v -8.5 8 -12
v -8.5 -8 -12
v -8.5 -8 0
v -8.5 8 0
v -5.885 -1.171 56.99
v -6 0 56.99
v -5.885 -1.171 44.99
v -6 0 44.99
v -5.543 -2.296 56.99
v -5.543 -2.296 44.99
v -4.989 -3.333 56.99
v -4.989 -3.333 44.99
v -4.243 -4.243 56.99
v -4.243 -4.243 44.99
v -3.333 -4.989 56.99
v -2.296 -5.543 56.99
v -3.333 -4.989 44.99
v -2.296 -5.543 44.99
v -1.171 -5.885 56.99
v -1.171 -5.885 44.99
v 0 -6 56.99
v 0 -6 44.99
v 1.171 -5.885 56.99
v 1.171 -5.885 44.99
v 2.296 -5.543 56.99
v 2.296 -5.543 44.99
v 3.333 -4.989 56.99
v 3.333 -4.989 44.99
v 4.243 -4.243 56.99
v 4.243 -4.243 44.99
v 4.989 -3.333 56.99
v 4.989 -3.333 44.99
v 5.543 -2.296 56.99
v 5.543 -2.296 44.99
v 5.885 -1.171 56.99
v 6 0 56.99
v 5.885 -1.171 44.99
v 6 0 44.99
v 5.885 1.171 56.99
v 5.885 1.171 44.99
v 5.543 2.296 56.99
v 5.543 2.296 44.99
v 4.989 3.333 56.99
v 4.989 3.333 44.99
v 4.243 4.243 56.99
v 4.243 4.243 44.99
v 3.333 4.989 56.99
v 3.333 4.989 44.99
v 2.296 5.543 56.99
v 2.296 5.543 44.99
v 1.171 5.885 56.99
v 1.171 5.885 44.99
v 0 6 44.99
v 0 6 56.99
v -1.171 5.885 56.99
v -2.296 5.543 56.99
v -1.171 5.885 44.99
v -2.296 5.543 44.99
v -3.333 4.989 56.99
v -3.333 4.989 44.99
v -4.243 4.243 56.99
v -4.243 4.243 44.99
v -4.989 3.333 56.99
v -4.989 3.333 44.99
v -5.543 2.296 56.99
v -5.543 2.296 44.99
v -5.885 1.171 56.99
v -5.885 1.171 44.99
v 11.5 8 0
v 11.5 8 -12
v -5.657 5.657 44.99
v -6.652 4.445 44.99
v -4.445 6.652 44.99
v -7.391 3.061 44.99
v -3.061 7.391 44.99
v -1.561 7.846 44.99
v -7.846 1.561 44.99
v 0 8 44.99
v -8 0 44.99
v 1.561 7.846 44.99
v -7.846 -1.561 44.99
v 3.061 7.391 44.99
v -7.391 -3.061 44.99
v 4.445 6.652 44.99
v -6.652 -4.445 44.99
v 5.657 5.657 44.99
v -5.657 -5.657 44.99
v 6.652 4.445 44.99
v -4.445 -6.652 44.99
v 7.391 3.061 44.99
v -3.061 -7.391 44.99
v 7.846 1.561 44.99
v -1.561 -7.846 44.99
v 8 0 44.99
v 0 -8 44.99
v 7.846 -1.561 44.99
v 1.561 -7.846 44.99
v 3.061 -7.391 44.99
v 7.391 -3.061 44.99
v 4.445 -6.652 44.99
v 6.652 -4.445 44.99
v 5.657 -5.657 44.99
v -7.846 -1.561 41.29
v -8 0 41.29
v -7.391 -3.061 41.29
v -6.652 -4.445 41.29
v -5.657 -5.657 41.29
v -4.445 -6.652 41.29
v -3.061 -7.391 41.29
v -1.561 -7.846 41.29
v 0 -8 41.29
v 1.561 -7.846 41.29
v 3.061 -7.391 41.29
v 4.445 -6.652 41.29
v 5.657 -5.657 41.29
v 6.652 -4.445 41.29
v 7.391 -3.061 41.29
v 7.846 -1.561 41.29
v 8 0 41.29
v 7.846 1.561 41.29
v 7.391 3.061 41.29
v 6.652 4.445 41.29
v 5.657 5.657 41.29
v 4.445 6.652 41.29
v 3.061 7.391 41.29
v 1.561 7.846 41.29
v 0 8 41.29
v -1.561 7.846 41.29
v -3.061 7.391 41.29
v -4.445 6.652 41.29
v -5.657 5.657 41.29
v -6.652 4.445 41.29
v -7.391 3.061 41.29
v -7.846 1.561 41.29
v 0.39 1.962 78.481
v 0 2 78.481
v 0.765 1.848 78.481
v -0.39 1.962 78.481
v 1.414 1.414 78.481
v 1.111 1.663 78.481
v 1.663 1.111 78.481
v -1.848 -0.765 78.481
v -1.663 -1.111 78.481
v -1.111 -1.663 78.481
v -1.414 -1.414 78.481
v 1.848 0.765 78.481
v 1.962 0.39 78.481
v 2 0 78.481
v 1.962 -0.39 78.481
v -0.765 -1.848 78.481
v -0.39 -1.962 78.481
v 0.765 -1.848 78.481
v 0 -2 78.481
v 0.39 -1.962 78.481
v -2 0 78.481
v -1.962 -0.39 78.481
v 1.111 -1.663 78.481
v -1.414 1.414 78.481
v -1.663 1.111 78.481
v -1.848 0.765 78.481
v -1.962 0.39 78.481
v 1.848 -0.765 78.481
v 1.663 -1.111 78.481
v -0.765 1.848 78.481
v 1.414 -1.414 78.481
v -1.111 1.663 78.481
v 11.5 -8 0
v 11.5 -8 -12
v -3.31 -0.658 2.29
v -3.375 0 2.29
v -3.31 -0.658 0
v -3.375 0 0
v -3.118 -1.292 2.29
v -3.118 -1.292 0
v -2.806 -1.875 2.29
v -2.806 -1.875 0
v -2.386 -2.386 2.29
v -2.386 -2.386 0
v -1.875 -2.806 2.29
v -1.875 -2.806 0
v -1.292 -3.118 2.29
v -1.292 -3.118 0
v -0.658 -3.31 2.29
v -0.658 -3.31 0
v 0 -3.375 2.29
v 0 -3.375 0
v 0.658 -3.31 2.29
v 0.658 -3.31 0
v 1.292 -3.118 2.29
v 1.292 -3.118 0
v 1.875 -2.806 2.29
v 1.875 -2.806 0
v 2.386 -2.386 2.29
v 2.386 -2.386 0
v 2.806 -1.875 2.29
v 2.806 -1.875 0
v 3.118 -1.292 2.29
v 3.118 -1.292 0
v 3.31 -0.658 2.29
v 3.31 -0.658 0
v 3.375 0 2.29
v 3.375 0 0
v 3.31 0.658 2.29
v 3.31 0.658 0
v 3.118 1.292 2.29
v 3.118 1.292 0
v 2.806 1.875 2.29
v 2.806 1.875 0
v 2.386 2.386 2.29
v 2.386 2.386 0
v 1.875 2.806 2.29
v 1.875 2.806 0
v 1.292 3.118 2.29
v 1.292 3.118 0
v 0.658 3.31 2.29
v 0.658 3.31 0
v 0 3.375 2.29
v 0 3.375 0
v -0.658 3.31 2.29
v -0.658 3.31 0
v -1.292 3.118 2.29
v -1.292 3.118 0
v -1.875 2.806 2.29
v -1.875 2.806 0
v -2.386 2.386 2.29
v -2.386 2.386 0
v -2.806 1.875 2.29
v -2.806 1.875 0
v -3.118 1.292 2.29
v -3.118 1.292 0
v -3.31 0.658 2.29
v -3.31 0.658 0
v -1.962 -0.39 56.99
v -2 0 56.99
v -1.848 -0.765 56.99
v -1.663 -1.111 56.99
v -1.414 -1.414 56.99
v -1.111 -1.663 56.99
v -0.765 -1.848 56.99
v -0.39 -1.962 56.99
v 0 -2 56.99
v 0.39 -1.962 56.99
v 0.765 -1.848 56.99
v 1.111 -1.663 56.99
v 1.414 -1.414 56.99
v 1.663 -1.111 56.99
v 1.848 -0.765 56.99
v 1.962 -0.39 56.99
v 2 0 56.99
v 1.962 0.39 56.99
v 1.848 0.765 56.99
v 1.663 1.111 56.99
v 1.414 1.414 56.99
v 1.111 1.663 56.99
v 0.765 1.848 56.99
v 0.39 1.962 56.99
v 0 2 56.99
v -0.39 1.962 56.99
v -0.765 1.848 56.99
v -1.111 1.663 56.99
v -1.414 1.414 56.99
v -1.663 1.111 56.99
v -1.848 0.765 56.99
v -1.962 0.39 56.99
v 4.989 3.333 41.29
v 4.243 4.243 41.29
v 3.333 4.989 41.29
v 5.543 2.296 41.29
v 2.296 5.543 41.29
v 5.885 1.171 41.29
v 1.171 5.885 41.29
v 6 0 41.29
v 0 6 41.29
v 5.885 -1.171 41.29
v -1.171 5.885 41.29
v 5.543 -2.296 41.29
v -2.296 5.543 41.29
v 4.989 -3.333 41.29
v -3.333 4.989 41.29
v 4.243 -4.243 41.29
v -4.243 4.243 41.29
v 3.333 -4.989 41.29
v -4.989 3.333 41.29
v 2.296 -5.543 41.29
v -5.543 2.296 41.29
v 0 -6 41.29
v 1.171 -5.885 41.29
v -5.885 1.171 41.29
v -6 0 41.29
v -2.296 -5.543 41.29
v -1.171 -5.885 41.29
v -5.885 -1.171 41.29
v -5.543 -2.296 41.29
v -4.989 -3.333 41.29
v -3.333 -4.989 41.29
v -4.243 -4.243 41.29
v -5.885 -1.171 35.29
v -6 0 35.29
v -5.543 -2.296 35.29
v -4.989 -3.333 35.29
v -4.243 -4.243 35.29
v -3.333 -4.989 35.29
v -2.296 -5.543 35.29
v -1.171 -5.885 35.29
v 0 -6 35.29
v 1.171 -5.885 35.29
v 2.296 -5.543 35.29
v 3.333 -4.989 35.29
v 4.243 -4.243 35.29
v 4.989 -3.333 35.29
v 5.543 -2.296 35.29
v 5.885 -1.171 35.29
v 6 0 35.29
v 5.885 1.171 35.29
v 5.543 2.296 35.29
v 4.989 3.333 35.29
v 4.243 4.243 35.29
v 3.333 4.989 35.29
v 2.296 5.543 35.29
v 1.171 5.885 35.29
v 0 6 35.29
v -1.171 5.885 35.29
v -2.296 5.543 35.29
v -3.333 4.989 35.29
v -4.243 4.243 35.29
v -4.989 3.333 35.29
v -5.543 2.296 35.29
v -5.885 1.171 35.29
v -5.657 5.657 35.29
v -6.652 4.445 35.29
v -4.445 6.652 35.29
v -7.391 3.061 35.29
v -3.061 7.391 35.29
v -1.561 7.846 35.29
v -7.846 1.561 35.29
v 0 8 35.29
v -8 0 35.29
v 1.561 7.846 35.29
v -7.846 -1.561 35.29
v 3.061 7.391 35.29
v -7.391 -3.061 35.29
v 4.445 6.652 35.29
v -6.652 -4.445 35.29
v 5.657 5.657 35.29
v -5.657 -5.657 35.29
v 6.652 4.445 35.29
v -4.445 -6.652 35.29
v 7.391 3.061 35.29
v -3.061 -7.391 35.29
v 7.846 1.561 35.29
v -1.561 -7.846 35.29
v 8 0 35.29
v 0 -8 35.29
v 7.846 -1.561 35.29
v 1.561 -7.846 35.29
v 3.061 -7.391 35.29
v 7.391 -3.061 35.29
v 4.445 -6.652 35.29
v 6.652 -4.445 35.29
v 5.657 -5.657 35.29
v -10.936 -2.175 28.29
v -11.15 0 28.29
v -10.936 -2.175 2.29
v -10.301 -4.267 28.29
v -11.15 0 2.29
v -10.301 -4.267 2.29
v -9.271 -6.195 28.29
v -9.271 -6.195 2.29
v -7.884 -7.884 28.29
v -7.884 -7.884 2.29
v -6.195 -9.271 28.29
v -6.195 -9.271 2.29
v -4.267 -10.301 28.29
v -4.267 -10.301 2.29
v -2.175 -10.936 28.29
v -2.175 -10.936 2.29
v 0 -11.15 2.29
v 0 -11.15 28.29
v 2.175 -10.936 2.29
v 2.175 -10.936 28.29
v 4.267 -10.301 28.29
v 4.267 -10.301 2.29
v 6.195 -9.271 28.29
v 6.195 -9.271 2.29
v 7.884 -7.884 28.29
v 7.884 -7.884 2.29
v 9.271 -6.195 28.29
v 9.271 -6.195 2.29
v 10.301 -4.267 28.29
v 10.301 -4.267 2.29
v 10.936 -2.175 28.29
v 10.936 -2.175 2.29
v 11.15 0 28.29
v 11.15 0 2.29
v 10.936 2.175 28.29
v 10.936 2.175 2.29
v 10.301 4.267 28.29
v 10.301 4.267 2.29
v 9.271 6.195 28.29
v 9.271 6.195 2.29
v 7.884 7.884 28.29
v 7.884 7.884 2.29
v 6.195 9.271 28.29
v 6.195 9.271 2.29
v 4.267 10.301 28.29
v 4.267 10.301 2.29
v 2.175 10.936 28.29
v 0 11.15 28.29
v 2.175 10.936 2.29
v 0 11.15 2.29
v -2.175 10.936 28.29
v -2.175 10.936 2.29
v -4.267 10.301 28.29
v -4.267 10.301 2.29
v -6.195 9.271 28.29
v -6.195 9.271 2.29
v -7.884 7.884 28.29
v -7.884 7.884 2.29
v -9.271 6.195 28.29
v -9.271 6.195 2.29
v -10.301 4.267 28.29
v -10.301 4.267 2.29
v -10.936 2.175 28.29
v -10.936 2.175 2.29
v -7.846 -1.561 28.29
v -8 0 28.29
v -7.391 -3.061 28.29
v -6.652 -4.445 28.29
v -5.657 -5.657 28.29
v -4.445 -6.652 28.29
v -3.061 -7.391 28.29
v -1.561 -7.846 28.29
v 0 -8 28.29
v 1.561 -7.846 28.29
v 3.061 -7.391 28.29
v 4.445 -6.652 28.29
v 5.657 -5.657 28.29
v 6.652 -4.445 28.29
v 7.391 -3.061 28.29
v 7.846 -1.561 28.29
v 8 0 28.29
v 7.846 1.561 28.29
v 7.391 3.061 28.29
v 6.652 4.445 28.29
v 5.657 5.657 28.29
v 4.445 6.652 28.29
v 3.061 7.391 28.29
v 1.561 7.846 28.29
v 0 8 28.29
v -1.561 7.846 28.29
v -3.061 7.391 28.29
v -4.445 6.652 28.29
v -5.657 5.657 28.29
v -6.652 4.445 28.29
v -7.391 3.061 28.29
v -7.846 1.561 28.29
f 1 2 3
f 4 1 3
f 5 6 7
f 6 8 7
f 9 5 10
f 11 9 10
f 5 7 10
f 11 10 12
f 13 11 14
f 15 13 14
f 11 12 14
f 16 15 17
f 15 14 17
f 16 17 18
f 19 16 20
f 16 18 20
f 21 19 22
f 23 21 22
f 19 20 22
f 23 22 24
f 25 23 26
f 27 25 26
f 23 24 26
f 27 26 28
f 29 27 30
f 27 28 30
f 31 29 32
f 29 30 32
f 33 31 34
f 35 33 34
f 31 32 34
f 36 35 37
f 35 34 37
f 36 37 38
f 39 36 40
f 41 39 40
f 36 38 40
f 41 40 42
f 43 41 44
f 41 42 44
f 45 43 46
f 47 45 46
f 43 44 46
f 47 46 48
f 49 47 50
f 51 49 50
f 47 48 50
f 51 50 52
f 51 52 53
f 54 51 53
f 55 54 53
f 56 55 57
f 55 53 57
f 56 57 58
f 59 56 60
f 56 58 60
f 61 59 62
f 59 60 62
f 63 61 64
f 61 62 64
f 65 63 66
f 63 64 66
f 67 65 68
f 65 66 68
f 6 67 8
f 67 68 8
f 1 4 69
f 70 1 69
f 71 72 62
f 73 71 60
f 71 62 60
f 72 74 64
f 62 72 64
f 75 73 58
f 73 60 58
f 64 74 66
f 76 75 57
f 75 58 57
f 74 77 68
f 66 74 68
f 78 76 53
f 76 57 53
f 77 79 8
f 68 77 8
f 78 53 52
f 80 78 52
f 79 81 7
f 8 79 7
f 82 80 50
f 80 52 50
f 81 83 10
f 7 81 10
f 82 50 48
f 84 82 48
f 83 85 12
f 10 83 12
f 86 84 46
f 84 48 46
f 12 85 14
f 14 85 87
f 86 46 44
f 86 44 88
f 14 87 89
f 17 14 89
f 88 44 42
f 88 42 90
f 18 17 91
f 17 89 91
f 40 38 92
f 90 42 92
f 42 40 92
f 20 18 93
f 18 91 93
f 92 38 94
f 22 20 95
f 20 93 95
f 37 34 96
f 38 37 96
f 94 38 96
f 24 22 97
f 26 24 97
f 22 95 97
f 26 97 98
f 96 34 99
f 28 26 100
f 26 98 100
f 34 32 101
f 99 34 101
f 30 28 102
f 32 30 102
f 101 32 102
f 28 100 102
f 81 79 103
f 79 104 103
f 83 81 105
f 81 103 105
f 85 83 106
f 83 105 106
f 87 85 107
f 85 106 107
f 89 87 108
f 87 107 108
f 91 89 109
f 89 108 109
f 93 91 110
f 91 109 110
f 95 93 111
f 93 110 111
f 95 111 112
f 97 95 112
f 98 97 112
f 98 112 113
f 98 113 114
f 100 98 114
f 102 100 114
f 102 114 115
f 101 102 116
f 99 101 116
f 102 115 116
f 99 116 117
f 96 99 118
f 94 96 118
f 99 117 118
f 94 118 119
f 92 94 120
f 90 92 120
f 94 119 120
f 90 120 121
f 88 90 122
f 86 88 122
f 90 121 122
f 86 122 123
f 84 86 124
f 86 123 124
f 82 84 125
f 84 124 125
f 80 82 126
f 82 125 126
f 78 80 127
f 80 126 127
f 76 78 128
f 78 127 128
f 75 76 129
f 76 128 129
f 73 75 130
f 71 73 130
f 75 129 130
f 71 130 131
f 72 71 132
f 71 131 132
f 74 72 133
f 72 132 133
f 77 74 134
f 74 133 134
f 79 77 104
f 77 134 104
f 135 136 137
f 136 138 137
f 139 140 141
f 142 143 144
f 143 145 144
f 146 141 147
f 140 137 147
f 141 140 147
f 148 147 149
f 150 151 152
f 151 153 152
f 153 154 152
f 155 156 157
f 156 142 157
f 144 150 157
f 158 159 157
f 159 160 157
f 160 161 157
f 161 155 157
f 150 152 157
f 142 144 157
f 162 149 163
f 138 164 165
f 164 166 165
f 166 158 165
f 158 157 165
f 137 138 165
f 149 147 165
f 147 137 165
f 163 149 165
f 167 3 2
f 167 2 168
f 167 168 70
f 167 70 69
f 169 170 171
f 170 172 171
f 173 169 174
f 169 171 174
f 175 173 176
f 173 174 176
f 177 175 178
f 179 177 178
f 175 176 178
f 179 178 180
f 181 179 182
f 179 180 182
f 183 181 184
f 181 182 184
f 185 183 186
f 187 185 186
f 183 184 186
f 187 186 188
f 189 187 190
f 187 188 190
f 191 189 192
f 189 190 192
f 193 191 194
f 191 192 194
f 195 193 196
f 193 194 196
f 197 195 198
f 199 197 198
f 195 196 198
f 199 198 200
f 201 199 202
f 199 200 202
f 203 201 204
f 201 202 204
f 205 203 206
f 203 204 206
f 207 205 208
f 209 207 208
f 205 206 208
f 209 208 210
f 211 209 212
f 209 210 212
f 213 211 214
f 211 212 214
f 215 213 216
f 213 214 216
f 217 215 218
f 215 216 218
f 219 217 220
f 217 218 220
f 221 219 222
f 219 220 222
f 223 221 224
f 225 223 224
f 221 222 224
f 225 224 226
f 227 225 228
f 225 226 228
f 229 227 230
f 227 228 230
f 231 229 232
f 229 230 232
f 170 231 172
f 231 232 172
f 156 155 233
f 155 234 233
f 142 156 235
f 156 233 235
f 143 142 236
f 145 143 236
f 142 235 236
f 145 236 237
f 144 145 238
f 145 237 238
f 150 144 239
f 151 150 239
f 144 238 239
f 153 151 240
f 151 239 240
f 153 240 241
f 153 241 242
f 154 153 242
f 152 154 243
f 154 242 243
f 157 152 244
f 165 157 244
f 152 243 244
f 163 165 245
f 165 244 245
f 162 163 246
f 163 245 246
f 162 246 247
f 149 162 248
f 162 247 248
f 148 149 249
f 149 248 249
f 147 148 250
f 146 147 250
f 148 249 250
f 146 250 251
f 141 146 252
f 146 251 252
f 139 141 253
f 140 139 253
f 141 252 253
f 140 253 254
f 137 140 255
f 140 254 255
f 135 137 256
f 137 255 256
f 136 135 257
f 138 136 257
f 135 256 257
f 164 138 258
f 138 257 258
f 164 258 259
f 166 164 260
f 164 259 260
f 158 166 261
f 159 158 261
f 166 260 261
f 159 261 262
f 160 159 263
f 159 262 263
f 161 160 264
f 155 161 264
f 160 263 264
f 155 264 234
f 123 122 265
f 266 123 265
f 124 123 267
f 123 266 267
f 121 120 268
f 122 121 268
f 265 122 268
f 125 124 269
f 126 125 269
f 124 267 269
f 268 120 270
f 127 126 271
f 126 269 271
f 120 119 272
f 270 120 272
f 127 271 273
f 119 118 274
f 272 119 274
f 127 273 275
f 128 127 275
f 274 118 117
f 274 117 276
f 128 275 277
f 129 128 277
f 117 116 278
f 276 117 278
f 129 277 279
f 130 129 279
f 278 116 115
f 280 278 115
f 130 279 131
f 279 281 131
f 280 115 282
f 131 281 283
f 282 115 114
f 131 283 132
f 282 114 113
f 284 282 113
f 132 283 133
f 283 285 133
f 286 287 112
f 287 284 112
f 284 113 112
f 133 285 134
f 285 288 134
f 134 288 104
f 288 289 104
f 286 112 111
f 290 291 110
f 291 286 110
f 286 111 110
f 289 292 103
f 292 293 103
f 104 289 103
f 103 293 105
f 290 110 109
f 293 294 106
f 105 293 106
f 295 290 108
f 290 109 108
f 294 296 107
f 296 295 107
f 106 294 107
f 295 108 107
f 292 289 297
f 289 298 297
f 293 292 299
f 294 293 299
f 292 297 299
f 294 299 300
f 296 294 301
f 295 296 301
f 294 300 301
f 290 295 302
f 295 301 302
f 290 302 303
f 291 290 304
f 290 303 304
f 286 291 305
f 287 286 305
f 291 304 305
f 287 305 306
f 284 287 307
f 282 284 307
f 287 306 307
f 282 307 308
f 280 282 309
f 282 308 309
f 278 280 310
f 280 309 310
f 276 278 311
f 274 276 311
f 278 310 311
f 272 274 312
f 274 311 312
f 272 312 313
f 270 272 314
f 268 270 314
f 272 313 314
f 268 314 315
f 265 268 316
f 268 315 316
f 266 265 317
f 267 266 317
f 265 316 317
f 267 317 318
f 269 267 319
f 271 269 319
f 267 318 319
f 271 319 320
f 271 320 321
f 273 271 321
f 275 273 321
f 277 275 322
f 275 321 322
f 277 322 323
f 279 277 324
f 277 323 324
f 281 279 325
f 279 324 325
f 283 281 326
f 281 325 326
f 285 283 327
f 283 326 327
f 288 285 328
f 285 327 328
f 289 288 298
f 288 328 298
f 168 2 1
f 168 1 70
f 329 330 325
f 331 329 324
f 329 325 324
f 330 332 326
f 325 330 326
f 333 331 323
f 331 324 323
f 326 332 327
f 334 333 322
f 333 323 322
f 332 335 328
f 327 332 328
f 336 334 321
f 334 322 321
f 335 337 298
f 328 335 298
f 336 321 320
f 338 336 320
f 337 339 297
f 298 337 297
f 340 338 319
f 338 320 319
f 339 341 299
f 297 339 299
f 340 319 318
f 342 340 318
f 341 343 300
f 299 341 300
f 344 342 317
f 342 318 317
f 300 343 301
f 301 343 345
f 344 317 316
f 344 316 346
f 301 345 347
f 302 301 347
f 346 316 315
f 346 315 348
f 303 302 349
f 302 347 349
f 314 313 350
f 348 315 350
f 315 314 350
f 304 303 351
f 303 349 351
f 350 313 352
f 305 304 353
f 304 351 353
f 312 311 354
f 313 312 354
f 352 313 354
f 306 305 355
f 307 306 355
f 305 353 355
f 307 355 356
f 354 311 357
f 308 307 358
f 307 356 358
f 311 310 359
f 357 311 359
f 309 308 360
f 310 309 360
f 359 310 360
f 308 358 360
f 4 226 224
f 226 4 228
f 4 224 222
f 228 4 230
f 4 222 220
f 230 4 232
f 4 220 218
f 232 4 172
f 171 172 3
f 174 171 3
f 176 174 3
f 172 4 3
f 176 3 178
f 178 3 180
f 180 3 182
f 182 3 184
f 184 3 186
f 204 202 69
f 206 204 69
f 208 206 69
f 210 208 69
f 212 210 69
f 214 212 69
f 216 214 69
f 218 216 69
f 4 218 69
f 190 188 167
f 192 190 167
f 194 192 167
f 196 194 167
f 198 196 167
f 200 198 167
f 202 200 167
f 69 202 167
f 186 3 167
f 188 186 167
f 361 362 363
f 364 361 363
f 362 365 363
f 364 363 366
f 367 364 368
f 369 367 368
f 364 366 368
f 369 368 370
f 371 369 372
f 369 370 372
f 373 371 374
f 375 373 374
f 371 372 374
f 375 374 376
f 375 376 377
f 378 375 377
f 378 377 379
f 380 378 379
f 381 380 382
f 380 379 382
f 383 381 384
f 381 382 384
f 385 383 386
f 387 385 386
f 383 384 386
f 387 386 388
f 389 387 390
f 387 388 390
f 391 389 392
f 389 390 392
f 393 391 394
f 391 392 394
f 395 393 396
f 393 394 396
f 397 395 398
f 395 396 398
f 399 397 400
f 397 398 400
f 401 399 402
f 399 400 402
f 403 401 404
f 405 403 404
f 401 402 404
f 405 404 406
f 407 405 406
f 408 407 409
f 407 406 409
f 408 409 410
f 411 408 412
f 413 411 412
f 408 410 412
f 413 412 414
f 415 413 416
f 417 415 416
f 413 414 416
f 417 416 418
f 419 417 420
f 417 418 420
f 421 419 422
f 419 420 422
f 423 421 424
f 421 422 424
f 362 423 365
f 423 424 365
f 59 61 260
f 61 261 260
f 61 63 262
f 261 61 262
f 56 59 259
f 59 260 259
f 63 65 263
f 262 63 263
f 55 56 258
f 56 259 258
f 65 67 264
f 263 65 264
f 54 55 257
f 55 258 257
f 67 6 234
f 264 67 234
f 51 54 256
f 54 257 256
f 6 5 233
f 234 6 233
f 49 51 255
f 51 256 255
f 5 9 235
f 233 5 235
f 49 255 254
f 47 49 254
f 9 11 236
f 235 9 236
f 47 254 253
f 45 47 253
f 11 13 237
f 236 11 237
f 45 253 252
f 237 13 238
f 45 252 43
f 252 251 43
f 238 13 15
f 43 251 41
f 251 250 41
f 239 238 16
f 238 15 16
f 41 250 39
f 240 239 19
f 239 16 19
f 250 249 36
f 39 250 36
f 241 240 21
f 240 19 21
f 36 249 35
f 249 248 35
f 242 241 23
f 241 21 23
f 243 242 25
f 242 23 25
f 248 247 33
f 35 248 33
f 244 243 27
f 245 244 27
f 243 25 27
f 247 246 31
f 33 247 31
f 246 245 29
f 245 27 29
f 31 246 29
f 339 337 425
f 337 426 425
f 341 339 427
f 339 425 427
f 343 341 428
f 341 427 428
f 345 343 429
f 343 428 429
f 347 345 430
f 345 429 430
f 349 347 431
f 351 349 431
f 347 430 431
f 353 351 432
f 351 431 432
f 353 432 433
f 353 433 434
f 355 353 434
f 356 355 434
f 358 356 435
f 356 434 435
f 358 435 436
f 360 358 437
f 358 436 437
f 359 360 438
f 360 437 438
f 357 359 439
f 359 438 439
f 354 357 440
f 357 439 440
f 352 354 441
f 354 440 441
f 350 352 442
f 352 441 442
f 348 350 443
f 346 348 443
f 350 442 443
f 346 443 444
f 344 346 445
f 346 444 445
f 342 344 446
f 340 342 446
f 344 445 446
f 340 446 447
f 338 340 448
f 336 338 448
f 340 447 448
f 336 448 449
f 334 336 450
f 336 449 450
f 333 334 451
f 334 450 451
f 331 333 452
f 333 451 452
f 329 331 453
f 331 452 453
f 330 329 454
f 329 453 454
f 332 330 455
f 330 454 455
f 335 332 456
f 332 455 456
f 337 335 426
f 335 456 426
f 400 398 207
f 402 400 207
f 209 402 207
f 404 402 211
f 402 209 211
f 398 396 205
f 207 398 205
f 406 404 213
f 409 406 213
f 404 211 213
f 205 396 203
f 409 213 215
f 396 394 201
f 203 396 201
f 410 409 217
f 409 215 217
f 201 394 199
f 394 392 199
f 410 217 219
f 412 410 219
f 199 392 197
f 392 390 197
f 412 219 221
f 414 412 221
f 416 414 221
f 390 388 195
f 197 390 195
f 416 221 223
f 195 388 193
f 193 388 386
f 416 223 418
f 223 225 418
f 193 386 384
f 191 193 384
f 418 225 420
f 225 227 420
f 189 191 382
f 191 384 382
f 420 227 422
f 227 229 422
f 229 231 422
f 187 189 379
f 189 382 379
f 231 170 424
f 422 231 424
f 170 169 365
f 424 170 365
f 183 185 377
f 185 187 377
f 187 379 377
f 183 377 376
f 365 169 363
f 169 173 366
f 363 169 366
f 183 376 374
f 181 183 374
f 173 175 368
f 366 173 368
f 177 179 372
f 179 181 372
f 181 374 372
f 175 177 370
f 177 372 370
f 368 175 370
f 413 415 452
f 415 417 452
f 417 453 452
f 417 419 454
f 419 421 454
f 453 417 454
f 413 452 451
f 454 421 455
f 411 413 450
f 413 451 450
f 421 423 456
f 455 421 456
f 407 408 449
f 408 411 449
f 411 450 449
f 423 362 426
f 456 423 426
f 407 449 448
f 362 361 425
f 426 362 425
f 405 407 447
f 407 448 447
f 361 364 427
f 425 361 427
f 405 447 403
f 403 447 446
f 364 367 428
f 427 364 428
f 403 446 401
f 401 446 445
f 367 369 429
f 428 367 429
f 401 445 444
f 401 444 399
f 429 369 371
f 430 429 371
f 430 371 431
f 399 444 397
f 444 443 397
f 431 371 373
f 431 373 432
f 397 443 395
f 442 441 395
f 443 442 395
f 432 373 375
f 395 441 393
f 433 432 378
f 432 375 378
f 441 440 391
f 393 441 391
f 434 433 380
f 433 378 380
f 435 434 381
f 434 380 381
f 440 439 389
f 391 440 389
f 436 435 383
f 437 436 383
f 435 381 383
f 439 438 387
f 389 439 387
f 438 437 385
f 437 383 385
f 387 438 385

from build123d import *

# Parameters (mm, degrees)
F2_W     = 20
F2_H     = 12
F3_DEPTH = 8


with BuildPart() as f1:
    # F0 (on Front) → F1 (revolve)
    with BuildSketch(Plane.XZ):
        Polygon((-3.375, 0), (0, 0), (0, 78.4805588418), (-2, 78.4805588418), (-2, 56.99), (-6, 56.99), (-6, 44.99), (-8, 44.99), (-8, 41.29), (-6, 41.29), (-6, 35.29), (-8, 35.29), (-8, 28.29), (-11.15, 28.29), (-11.15, 2.29), (-3.375, 2.29), align=None)
    revolve(axis=Axis((0, 0, 37.5557746226), (0, 0, 1)))

    # F2 (on Front) → F3 (join, symmetric)
    with BuildSketch(Plane.XZ):
        with Locations((1.5, -6)):
            Rectangle(F2_W, F2_H)
    extrude(amount=F3_DEPTH, both=True)


solid = f1.part
